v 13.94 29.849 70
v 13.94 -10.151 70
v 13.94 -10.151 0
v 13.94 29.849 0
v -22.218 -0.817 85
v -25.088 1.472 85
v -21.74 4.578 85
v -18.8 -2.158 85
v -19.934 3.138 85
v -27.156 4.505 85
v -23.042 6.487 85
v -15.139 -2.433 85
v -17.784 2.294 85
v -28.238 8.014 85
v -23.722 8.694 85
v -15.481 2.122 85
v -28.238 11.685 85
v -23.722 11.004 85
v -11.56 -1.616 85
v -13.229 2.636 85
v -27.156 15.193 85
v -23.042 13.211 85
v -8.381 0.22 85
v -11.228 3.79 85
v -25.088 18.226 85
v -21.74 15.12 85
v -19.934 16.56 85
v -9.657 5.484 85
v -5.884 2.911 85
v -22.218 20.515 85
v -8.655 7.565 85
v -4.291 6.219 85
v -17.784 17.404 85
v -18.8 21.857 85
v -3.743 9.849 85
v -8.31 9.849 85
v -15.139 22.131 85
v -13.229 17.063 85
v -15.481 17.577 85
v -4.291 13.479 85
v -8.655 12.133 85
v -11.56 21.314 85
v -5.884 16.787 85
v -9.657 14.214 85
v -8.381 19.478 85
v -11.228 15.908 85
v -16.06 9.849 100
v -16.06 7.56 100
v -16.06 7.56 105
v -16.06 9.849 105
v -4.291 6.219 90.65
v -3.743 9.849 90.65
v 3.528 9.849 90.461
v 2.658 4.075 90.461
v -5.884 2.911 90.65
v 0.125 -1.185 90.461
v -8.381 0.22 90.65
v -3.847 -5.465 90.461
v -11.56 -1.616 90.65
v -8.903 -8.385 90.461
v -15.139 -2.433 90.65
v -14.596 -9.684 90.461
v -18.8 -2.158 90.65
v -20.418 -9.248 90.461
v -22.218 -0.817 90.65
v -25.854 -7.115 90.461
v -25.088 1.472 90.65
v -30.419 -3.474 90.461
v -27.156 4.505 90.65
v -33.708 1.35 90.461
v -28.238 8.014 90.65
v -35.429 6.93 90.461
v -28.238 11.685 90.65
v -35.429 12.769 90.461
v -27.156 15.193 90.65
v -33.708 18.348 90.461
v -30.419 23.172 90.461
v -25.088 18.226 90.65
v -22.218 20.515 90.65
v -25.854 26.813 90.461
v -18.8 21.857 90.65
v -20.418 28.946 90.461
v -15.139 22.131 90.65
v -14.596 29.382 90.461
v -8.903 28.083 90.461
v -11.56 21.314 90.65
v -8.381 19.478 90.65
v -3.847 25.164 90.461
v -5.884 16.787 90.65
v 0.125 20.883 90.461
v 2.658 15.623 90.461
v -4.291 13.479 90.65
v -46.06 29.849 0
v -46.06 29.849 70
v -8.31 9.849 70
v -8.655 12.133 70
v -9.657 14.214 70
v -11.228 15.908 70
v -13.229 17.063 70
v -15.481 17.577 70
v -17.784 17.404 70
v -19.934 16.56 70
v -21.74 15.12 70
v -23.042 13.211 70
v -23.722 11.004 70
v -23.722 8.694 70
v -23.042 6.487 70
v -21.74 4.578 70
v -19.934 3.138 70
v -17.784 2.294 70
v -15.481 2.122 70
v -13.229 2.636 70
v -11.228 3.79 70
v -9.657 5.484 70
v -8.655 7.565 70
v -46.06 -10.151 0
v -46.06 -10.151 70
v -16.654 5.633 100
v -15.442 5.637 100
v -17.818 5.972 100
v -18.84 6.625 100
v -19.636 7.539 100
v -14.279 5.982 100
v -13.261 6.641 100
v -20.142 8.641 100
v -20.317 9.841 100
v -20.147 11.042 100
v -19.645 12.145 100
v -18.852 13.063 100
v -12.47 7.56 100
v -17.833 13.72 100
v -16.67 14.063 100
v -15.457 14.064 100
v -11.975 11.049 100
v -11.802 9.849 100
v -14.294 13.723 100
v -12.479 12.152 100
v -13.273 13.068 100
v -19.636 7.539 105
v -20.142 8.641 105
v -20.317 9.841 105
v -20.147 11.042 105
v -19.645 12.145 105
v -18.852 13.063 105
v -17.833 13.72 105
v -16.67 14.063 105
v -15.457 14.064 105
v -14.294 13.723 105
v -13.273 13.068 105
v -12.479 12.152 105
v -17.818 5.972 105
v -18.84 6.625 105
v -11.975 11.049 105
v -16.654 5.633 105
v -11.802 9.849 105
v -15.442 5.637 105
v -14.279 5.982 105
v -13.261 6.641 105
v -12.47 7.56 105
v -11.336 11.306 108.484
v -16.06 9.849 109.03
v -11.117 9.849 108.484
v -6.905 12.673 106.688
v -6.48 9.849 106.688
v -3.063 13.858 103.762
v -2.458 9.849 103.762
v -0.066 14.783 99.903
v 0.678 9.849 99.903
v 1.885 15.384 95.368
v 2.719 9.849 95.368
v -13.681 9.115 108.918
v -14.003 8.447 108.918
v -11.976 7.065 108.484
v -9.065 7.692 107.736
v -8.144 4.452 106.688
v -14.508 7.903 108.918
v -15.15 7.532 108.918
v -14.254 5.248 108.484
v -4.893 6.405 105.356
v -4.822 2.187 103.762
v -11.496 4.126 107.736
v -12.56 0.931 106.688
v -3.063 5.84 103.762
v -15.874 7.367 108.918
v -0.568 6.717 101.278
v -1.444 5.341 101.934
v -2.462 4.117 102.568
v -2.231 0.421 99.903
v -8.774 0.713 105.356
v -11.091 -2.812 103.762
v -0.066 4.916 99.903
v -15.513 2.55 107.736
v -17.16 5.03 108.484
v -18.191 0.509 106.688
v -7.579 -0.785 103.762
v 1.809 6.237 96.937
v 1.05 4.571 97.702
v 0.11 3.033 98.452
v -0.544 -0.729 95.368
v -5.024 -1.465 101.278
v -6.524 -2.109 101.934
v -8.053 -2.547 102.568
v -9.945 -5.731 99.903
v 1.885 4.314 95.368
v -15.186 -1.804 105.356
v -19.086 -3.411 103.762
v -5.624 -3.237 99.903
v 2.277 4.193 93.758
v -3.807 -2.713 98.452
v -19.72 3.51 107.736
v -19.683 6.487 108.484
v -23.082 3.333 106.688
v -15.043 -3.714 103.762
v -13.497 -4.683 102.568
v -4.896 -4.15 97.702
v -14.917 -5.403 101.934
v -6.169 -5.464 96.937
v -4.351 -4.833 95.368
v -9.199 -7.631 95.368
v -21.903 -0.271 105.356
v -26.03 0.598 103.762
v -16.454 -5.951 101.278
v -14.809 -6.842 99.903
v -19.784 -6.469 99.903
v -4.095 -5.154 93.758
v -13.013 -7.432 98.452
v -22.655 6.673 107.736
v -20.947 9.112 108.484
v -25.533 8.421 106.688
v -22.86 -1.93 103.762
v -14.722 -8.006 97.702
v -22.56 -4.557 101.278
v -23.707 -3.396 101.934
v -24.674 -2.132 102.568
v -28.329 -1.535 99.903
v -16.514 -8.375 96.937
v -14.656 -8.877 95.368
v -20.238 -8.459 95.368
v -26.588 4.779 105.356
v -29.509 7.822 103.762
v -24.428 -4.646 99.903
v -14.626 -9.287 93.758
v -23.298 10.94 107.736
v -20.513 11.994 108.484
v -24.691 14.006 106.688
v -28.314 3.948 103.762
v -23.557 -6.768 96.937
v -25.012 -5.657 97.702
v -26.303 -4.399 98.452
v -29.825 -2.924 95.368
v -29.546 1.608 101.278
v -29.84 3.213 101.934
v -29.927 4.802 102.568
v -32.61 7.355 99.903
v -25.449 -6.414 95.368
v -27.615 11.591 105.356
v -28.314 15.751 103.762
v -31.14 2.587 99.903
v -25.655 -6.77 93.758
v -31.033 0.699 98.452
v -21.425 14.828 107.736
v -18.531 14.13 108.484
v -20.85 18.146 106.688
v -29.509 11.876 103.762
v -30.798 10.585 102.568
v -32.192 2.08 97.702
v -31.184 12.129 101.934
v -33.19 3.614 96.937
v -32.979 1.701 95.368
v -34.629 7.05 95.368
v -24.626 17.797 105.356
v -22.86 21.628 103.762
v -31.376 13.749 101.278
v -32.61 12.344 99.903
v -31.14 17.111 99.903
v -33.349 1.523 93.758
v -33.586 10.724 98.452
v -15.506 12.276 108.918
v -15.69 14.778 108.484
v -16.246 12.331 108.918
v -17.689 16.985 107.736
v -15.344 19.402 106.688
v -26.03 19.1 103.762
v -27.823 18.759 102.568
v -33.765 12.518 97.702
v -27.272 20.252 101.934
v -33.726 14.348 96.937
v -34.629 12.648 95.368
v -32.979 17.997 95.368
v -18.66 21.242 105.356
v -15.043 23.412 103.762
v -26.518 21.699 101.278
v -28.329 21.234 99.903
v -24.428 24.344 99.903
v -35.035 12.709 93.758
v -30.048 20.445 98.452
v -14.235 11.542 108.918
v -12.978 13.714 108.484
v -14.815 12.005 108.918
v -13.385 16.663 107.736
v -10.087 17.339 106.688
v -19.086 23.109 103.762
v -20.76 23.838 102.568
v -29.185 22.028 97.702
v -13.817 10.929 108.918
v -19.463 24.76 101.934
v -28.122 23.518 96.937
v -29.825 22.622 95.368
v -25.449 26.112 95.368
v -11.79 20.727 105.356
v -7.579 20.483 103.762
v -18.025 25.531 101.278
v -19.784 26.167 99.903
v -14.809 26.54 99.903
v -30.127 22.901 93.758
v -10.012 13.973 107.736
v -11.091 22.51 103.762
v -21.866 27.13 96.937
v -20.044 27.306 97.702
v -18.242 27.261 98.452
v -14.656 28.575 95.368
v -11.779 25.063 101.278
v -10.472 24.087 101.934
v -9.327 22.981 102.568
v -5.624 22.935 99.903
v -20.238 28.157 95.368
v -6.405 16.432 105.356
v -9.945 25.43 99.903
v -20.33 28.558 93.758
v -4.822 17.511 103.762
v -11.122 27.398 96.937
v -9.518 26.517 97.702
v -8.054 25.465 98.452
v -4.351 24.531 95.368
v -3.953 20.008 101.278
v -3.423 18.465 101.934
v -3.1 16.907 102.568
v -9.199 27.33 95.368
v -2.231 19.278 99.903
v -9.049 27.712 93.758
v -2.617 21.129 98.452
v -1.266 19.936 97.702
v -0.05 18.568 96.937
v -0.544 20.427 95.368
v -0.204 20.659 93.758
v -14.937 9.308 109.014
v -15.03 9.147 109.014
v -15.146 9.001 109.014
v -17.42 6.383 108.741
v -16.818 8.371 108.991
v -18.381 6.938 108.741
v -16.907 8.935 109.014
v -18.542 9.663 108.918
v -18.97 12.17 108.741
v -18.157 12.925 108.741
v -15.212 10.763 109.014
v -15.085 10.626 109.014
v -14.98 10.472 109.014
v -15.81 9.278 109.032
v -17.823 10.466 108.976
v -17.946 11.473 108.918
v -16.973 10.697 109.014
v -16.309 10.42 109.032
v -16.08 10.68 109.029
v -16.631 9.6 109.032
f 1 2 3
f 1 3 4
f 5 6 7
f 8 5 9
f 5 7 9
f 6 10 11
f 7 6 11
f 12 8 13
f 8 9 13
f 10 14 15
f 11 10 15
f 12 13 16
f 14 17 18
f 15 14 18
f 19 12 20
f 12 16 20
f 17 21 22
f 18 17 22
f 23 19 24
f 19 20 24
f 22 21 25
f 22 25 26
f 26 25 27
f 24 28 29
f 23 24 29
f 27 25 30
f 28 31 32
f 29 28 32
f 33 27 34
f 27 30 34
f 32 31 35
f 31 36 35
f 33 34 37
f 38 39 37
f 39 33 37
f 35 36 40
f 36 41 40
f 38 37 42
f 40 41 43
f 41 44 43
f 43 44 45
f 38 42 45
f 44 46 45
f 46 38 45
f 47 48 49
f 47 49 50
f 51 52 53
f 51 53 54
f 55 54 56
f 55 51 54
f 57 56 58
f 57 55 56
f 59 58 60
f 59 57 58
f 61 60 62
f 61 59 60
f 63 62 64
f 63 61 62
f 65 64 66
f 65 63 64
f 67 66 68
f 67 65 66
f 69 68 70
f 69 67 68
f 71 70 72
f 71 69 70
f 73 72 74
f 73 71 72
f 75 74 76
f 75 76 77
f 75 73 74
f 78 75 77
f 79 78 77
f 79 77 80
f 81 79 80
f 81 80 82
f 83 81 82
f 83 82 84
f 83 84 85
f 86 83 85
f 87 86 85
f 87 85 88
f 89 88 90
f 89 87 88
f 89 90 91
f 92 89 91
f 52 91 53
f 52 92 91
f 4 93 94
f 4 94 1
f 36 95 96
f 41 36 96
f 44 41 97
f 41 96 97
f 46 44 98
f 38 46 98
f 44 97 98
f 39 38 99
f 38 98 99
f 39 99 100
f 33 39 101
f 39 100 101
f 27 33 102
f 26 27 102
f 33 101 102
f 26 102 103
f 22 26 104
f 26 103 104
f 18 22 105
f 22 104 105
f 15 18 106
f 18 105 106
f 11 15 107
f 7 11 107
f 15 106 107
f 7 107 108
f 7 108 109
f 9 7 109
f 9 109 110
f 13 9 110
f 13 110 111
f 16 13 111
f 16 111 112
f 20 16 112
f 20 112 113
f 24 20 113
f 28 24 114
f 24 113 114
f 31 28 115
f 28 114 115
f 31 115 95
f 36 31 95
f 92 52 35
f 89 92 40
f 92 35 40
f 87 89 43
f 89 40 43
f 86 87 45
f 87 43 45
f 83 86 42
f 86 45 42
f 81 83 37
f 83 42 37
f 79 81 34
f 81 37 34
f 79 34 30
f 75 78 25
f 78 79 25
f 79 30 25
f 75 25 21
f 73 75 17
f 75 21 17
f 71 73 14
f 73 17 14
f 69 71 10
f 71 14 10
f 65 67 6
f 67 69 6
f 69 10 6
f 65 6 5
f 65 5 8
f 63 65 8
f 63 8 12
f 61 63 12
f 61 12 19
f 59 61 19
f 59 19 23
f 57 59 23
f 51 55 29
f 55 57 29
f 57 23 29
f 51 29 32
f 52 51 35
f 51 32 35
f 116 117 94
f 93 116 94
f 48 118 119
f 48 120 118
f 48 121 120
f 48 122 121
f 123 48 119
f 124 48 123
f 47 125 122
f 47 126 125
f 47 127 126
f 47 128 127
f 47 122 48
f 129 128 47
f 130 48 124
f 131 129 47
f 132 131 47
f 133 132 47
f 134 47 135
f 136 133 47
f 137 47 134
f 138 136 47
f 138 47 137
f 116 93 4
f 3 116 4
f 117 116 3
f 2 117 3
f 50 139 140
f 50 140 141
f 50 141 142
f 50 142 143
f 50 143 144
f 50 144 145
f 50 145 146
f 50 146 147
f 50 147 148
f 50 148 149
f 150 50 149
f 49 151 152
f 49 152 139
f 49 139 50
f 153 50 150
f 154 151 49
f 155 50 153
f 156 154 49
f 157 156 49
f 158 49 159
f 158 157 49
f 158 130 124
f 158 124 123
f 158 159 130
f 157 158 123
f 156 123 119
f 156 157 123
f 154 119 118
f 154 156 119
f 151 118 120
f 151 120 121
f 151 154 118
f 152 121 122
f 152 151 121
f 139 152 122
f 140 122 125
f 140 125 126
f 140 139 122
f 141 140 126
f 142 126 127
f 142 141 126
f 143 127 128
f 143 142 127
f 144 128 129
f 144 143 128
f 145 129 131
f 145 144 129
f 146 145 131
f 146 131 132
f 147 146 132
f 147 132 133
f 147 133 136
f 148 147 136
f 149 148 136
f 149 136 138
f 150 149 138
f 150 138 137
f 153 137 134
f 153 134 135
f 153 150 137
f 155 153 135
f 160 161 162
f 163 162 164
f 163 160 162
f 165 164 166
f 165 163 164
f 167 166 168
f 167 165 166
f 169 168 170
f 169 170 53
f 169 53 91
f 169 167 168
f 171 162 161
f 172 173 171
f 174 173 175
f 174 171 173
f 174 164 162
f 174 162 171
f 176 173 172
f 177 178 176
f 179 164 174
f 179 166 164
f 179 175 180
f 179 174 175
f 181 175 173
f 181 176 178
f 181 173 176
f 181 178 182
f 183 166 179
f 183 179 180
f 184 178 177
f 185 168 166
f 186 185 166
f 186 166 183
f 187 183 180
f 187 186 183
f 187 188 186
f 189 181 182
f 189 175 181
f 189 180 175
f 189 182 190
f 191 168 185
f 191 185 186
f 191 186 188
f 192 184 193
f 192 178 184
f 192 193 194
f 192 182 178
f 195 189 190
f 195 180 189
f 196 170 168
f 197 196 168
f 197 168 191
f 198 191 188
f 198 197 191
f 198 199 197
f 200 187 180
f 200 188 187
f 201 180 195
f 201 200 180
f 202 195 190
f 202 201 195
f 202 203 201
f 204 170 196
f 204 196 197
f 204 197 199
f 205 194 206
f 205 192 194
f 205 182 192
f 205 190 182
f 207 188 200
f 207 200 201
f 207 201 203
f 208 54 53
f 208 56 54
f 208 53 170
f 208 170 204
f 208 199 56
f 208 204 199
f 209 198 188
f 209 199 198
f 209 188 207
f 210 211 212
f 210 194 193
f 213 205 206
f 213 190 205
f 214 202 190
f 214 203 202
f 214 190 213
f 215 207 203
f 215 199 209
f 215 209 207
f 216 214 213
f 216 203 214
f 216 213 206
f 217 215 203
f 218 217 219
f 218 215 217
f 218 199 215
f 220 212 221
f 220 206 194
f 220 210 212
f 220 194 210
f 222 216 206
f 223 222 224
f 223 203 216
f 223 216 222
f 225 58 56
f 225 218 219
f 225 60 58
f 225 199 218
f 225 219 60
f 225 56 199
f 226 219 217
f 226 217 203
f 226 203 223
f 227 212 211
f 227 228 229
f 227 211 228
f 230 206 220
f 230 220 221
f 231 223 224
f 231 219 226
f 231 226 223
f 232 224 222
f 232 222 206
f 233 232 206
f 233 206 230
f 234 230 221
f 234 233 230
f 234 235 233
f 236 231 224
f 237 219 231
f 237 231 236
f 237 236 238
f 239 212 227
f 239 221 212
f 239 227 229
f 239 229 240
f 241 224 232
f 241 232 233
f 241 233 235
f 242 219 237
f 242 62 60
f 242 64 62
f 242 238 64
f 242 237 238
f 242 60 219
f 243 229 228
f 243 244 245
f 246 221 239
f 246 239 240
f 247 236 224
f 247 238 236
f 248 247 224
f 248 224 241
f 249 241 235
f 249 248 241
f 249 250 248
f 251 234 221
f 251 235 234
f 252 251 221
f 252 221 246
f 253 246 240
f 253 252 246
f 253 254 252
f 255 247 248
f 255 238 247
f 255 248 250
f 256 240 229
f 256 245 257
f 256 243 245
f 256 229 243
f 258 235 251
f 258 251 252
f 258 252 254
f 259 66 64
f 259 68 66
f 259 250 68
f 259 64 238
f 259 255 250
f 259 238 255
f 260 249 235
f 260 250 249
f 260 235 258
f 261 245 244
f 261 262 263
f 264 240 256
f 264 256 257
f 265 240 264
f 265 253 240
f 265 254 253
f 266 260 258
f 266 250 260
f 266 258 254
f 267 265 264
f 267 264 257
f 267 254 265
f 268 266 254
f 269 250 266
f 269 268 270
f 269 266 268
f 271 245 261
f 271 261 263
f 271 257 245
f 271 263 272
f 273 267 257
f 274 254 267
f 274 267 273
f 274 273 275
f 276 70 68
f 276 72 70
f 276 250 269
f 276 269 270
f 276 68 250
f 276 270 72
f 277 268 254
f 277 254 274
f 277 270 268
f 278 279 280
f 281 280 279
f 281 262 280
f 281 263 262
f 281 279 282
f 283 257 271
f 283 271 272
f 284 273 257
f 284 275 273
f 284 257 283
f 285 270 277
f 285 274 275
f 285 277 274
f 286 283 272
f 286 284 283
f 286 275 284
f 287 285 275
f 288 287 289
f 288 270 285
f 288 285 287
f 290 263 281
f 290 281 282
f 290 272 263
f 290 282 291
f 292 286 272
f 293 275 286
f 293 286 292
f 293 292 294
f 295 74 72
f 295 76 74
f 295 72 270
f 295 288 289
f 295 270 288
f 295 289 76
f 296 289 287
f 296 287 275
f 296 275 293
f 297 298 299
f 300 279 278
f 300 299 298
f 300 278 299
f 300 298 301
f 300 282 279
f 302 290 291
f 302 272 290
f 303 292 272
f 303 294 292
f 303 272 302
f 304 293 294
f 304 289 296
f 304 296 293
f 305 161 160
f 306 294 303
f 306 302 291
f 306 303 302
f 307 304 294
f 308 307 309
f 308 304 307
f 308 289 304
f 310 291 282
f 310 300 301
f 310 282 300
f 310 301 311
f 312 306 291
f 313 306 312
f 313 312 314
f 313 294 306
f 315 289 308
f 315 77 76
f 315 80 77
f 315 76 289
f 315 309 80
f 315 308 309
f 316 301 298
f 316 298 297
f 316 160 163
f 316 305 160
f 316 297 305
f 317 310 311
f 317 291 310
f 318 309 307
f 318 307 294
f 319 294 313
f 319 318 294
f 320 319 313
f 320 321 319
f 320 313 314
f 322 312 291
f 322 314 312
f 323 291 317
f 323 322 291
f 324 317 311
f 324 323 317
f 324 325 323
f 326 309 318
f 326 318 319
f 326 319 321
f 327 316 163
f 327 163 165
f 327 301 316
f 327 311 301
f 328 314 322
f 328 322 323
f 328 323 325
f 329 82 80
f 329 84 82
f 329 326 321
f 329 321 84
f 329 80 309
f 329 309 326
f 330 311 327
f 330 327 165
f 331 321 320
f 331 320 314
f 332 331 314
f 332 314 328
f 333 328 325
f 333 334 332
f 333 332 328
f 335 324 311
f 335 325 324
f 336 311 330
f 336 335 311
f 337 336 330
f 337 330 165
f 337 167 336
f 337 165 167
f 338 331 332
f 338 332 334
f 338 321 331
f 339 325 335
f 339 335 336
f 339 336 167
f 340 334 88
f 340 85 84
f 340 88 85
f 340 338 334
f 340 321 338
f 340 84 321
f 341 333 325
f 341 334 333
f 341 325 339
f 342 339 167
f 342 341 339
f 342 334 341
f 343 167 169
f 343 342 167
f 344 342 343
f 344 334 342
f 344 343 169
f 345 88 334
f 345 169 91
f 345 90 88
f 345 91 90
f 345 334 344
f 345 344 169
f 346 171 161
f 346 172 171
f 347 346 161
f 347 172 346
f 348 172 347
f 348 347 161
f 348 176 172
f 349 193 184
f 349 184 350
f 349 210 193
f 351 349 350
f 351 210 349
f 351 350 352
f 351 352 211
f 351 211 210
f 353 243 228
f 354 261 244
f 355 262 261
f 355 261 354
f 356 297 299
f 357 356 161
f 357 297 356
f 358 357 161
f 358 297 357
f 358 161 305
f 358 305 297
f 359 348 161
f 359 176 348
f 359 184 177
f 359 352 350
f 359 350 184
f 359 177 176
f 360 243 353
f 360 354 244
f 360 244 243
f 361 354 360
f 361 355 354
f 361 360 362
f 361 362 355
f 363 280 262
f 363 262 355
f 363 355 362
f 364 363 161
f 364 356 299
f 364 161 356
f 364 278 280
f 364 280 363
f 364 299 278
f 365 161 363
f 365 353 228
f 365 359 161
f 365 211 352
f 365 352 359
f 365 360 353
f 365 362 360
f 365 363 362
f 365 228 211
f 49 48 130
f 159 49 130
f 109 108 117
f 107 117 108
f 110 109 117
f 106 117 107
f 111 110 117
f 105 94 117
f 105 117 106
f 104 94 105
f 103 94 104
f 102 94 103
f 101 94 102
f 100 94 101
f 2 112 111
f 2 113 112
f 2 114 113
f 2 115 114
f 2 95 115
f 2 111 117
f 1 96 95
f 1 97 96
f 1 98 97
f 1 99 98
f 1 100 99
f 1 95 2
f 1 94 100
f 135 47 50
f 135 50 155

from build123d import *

# Parameters (mm, degrees)
F0_W     = 60
F0_H     = 40
F1_DEPTH = 70
F2_R     = 7.749318
F3_DEPTH = 15
F4_R     = 12.316216
F5_DEPTH = 15
F6_W     = 4.257482
F6_H     = 2.289564
F7_DEPTH = 5


with BuildPart() as f1:
    # F0 (on Top) → F1 (new body)
    with BuildSketch(Plane.XY):
        with Locations((-16.059712, 9.84915)):
            Rectangle(F0_W, F0_H)
    extrude(amount=F1_DEPTH)

    # F2 (on face) → F3 (join)
    with BuildSketch(Plane.XY.offset(70)):
        with Locations((-16.059712, 9.84915)):
            Circle(F2_R)
    extrude(amount=F3_DEPTH)

    # F4 (on face) → F5 (join)
    with BuildSketch(Plane.XY.offset(85)):
        with Locations((-16.059712, 9.84915)):
            Circle(F4_R)
    extrude(amount=F5_DEPTH)

    # F6 (on face) → F7 (join)
    with BuildSketch(Plane.XY.offset(100)):
        with Locations((-13.930971, 8.704368)):
            Rectangle(F6_W, F6_H)
    extrude(amount=F7_DEPTH)

    # F8 (on face) → F9 (revolve)
    with BuildSketch(Plane(origin=(0, 9.84915, 0), x_dir=(-1, 0, 0), z_dir=(0, 1, 0))):
        with BuildLine():
            Line((16.059712, 90.969634), (16.059712, 100))
            Line((16.059712, 100), (11.80223, 100))
            Line((11.80223, 100), (11.80223, 105))
            Line((11.80223, 105), (16.059712, 105))
            Line((16.059712, 105), (16.059712, 109.030366))
            ThreePointArc((16.059712, 109.030366), (2.458365, 103.762126), (-3.528251, 90.461321))
            Line((-3.528251, 90.461321), (16.059712, 90.969634))
        make_face()
    revolve(axis=Axis((-16.059712, 9.84915, 95.484817), (0, 0, -1)))


solid = f1.part
